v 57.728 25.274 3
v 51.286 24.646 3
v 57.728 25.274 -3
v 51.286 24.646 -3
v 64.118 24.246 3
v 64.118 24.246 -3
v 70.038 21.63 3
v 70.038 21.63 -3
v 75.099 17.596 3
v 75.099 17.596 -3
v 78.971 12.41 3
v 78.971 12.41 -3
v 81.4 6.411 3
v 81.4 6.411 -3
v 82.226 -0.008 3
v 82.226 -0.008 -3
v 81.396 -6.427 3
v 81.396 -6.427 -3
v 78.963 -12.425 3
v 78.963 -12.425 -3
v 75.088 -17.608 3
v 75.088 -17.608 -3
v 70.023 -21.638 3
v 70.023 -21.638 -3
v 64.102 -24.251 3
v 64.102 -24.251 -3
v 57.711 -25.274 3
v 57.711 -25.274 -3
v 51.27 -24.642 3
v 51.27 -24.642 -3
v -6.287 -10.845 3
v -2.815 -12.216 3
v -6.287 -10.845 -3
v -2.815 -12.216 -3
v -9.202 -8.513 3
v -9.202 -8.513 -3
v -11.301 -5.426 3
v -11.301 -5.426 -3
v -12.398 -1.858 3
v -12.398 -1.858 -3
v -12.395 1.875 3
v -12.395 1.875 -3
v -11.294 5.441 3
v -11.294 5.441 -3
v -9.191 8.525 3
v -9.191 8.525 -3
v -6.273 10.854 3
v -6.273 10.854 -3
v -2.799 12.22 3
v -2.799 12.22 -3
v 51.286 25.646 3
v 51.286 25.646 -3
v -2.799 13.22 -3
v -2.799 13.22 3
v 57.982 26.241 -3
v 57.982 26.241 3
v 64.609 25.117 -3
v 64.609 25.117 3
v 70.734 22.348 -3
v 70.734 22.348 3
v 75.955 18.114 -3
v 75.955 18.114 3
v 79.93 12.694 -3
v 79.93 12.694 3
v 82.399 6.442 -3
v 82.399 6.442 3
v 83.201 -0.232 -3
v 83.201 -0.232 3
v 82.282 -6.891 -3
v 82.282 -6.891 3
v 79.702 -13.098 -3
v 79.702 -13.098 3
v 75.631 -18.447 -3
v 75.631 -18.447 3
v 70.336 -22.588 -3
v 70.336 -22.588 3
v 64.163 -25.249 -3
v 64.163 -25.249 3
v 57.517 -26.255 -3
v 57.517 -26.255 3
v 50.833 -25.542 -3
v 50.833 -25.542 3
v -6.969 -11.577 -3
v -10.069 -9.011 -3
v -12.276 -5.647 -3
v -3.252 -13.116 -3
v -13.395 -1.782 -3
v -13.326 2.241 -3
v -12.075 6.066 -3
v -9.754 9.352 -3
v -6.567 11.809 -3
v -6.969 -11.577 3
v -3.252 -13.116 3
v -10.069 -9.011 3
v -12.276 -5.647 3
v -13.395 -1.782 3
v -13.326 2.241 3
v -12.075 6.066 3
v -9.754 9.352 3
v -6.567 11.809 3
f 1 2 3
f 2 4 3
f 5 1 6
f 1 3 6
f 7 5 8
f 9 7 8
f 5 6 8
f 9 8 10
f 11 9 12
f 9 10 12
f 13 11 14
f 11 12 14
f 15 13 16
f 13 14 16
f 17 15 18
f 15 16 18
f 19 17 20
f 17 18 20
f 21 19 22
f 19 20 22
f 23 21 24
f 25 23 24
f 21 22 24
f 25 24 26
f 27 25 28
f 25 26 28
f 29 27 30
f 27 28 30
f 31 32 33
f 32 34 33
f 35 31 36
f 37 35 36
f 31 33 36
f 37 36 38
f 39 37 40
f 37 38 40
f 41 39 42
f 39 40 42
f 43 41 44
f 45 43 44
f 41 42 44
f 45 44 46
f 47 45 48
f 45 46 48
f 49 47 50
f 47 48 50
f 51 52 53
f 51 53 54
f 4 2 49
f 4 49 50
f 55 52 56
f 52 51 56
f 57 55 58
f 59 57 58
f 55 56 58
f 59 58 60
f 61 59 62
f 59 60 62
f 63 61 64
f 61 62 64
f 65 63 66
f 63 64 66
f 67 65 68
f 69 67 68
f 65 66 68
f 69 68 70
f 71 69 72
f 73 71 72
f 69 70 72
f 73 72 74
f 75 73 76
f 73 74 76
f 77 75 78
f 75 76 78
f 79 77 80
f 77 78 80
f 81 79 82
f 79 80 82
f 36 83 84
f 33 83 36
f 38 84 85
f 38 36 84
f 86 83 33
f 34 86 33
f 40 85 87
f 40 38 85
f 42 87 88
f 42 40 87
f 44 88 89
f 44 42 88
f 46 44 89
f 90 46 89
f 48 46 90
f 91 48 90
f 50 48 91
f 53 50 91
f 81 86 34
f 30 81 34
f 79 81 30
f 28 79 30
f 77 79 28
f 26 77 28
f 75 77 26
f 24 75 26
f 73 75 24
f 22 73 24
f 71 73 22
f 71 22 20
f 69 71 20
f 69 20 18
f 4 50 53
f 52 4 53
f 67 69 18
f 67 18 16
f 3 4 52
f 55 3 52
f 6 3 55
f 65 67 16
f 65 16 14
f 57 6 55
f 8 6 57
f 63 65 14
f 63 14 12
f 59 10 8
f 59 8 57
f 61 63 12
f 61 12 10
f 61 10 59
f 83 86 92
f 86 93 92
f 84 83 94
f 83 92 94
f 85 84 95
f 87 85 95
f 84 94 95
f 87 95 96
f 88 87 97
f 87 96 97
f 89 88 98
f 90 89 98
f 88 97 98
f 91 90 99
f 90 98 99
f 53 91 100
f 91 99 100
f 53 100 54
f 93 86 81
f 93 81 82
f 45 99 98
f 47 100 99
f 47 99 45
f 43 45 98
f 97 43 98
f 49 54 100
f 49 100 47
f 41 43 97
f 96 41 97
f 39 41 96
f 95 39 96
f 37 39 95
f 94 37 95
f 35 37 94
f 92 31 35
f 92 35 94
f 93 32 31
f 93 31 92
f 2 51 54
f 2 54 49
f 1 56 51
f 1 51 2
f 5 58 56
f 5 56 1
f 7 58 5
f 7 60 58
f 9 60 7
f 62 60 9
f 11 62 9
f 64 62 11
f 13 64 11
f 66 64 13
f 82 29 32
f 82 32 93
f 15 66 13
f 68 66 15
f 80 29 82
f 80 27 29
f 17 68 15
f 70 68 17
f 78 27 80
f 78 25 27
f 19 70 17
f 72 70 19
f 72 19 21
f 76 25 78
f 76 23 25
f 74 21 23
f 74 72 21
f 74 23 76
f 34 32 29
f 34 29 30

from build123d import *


with BuildPart() as part:
    # Sweep1: sweep along a path in Sketch1
    with BuildLine(Plane.XY) as sweep1_path:
        Line((-2.798998946, 12.182594342), (51.286022129, 24.608840571))
        ThreePointArc((51.286022129, 24.608840571), (82.19, 0), (51.286022129, -24.608840571))
        Line((51.286022129, -24.608840571), (-2.798998946, -12.182594342))
        ThreePointArc((-2.798998946, -12.182594342), (-12.5, 0), (-2.798998946, 12.182594342))
    # Sketch2 → Sweep1 (sweep)
    with BuildSketch(Plane(origin=(-2.798998946, 0, 0), x_dir=(0, 0, -1), z_dir=(1, 0, 0))):
        Polygon((0, 12.21966763), (-3, 12.21966763), (-3, 13.21966763), (3, 13.21966763), (3, 12.21966763), align=None)
    sweep(path=sweep1_path.line)


solid = part.part
